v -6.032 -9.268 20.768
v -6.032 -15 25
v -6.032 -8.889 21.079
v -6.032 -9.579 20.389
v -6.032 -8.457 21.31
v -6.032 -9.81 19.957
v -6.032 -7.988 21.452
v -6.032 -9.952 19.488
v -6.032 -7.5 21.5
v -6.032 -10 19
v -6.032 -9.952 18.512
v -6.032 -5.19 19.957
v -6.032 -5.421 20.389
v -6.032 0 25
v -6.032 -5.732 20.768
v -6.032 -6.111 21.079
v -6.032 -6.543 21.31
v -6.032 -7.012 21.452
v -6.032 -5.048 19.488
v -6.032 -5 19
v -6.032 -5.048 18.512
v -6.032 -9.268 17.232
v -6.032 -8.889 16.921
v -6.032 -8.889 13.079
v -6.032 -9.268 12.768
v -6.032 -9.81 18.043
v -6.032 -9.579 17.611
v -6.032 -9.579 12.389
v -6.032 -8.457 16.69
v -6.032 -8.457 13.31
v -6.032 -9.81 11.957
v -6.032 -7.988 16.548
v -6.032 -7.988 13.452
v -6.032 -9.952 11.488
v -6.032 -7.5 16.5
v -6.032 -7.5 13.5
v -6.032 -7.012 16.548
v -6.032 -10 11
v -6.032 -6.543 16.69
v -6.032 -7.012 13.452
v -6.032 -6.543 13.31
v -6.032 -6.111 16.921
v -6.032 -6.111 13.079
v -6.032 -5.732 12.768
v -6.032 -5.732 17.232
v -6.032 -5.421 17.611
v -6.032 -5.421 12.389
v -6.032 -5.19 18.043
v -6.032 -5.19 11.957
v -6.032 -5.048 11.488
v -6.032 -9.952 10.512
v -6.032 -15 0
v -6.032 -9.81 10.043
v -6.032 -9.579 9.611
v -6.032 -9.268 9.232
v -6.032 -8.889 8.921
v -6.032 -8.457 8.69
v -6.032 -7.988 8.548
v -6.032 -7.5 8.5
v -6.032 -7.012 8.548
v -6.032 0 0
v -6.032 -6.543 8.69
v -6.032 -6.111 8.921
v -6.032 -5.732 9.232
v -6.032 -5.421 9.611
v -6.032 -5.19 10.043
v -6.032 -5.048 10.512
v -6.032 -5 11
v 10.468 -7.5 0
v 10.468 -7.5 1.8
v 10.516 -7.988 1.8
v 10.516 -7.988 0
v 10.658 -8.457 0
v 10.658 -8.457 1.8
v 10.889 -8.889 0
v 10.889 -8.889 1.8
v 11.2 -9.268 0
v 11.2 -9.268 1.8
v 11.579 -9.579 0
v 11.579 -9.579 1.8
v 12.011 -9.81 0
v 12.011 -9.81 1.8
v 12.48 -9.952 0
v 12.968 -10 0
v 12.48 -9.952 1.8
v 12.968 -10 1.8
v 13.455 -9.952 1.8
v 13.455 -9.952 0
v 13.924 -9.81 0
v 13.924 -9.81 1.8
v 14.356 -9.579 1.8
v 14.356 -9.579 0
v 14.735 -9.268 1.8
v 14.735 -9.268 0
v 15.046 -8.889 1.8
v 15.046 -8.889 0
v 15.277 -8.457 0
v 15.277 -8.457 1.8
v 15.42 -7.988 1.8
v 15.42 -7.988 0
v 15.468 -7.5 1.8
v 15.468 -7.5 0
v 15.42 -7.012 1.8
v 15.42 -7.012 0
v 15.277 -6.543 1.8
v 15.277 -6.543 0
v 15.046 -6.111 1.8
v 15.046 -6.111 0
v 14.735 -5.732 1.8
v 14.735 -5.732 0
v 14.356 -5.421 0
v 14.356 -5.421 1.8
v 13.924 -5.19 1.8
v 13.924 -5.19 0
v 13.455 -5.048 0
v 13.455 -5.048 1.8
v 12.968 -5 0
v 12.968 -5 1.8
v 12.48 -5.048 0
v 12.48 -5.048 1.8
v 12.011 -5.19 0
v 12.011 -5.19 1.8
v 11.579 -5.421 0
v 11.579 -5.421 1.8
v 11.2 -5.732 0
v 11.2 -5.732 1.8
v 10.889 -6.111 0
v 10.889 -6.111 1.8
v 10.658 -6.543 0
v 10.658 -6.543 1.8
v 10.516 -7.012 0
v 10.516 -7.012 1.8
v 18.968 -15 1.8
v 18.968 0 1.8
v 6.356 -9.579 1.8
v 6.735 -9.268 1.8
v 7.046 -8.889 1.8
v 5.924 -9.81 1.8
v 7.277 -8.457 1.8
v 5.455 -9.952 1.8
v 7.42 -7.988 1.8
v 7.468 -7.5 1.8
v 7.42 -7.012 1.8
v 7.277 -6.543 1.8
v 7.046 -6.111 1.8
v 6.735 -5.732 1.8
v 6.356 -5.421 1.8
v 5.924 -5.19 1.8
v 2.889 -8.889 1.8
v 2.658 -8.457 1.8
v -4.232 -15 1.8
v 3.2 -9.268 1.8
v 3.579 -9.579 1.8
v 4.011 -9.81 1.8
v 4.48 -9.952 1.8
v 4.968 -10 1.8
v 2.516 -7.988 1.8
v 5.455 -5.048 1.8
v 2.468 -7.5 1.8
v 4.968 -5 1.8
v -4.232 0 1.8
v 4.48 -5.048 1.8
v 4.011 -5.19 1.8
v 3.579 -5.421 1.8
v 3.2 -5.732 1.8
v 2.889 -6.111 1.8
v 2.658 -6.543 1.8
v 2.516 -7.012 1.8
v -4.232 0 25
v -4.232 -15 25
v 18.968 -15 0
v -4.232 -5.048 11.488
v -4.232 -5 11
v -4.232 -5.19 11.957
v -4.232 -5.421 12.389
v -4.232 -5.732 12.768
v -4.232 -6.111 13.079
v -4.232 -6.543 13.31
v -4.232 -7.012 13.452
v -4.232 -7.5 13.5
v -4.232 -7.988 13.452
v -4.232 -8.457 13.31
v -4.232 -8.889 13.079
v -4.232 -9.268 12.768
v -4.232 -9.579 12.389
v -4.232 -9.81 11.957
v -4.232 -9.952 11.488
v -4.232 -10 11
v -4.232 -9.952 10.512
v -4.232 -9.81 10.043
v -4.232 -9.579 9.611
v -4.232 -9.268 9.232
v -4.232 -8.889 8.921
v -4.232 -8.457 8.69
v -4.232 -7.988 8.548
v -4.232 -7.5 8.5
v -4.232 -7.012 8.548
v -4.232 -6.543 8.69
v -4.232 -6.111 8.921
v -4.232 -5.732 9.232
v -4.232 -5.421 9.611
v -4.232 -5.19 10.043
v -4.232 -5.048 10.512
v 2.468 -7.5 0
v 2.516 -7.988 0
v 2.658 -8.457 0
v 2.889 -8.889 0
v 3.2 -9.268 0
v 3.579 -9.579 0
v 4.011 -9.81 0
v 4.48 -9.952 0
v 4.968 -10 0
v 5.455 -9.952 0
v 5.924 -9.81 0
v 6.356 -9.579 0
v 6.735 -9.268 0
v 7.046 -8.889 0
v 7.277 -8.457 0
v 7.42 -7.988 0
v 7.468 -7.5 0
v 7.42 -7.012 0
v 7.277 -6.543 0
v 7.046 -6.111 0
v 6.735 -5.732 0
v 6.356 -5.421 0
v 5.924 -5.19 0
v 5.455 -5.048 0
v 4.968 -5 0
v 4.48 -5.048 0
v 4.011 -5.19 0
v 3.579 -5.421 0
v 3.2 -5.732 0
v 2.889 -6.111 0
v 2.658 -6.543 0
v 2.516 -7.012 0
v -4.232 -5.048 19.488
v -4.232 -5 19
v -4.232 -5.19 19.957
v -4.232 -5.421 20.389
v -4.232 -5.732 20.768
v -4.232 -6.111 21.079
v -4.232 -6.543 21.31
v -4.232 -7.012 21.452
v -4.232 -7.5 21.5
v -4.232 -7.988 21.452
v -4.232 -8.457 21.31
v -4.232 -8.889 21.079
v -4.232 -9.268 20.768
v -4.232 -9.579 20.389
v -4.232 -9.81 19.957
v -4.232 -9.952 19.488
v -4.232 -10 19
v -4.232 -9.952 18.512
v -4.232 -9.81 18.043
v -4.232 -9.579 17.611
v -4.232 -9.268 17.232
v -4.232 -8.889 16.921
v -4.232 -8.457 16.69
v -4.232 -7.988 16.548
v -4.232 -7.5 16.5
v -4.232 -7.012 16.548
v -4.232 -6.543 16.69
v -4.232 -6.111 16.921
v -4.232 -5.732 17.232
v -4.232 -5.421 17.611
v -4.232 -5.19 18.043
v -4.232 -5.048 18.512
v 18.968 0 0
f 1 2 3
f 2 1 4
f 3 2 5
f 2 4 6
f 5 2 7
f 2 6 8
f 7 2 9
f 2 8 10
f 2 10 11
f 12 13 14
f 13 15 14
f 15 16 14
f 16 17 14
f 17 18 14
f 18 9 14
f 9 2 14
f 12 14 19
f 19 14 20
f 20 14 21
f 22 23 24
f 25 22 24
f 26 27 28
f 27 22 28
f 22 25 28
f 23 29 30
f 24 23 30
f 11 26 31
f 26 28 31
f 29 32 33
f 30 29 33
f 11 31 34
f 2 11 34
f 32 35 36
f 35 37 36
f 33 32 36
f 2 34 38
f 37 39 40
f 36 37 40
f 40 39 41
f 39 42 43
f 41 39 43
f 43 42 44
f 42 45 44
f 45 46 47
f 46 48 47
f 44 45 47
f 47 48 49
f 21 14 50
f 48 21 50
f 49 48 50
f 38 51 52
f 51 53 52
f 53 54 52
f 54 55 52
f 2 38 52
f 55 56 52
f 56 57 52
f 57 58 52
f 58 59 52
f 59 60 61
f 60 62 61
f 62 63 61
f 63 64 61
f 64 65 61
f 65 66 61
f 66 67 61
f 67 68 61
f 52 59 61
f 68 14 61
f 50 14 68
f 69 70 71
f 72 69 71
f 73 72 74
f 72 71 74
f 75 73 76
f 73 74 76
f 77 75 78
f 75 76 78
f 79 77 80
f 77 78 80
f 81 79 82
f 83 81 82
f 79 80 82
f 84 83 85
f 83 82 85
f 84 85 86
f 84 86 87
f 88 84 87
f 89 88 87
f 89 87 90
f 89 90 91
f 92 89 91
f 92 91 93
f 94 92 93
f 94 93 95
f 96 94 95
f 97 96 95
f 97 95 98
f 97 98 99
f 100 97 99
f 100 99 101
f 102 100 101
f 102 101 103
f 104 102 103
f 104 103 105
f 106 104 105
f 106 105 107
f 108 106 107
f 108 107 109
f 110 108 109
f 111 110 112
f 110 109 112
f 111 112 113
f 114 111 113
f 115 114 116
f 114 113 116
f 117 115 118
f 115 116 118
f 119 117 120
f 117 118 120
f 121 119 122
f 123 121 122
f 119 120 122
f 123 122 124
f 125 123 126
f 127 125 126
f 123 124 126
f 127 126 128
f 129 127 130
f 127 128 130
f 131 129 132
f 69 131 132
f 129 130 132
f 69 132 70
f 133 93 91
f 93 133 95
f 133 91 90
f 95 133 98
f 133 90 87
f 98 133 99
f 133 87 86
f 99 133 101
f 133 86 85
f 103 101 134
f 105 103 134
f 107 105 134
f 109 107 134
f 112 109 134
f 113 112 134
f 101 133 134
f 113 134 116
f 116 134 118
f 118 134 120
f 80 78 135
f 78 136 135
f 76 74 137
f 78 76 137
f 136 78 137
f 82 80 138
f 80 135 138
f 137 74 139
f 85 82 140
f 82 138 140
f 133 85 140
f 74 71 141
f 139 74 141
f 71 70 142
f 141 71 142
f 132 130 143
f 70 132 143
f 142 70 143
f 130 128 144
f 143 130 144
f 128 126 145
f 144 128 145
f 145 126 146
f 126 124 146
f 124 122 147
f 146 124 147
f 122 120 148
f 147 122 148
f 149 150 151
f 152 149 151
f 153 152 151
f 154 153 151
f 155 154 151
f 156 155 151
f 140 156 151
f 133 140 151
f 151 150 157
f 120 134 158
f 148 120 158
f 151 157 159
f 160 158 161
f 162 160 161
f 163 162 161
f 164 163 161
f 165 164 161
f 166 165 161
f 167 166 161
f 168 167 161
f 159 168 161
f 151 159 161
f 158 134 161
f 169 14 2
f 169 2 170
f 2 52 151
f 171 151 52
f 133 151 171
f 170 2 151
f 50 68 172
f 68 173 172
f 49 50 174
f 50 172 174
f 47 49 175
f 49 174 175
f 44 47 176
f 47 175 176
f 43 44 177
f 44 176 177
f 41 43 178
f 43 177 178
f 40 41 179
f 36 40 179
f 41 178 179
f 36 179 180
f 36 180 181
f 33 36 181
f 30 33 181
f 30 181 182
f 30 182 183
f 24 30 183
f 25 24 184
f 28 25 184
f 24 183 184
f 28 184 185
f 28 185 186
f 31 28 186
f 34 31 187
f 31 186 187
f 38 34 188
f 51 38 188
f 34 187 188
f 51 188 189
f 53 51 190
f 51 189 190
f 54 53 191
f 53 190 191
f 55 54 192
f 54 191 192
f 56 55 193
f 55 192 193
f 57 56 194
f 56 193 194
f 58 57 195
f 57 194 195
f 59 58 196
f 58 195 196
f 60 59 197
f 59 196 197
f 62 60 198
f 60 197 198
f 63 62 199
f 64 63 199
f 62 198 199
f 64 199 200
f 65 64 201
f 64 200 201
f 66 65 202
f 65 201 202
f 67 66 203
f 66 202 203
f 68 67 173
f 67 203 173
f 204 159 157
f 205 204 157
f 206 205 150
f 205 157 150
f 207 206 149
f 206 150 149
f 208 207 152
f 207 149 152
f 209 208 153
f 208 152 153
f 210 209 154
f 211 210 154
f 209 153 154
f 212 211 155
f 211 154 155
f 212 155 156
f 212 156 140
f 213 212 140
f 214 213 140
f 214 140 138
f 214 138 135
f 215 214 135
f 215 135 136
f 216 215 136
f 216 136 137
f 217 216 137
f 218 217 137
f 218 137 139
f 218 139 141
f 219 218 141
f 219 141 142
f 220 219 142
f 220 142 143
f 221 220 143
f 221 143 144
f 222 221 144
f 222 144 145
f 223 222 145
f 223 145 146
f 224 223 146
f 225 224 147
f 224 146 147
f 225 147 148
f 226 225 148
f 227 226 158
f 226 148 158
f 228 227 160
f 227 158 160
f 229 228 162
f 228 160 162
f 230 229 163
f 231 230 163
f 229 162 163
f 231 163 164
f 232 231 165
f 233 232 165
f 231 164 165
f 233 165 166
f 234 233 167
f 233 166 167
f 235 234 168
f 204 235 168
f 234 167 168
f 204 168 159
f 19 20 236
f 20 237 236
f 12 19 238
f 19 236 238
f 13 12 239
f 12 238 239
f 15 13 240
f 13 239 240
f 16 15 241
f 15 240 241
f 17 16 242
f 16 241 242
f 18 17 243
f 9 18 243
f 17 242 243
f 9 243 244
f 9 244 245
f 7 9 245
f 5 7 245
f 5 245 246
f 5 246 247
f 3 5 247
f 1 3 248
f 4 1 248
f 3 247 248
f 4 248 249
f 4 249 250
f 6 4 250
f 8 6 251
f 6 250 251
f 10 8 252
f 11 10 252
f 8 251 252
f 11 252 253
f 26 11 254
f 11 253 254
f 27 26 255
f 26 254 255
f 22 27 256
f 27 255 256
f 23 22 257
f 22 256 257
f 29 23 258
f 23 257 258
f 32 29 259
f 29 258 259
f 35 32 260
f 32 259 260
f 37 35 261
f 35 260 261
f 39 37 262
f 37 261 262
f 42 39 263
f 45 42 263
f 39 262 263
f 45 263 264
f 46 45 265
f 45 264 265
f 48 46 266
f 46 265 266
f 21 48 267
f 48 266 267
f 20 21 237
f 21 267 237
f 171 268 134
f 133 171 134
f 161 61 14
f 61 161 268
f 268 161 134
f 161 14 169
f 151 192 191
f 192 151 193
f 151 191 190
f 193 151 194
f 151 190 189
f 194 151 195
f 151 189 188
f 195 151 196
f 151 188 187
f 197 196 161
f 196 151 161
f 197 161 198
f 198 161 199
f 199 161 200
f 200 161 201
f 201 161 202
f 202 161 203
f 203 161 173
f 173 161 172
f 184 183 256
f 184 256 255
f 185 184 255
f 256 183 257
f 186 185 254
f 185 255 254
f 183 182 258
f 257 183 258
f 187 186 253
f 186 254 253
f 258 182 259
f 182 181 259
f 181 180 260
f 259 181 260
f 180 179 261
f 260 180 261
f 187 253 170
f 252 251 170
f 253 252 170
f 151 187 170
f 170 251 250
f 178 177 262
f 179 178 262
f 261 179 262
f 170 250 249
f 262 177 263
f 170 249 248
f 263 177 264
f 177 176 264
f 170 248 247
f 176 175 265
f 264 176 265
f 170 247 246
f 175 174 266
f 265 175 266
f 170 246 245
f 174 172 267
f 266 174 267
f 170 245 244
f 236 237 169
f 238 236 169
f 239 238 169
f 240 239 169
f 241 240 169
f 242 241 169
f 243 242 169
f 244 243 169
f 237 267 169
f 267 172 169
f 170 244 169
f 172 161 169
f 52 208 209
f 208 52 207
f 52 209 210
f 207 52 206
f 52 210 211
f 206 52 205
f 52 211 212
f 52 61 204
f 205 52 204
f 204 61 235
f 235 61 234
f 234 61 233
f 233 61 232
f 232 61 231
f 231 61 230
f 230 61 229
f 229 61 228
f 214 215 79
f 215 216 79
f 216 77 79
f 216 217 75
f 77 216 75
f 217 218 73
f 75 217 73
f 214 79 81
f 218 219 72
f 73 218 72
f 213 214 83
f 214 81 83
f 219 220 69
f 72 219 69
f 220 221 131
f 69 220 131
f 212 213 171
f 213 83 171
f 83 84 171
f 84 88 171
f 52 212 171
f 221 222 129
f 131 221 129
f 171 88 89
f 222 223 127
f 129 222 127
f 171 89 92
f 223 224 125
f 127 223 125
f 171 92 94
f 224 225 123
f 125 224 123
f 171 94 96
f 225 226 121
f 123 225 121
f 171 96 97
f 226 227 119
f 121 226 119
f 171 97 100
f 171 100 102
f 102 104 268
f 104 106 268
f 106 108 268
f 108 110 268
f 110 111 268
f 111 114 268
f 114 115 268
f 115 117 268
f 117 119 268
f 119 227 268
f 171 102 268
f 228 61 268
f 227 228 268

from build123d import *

# Parameters (mm, degrees)
F0_W           = 1.8
F0_H           = 1.7999967287
F0_W_2         = 23.2
F0_H_2         = 23.2000032713
F1_DEPTH       = 15
F4_D           = 5
F4_DEPTH       = 1.8
F4_TIP         = 1.5021515476
F4_ON_F3_D     = 5
F4_ON_F3_DEPTH = 1.8
F4_ON_F3_TIP   = 1.5021515476


with BuildPart() as f1:
    # F0 (on Front) → F1 (new body)
    with BuildSketch(Plane.XZ):
        with Locations((-5.1324295796, 0.8999983644)):
            Rectangle(F0_W, F0_H)
        with Locations((7.3675704204, 0.8999983644)):
            Rectangle(F0_W_2, F0_H)
        with Locations((-5.1324295796, 13.3999983644)):
            Rectangle(F0_W, F0_H_2)
    extrude(amount=F1_DEPTH)

    # F4
    with Locations(Plane(origin=(-6.0324295796, 0, 0), x_dir=(0, -1, 0), z_dir=(-1, 0, 0))):
        with Locations((7.5, 19), (7.5, 11)):
            Hole(F4_D / 2, depth=F4_DEPTH)
            with Locations((0, 0, -(F4_DEPTH + F4_TIP / 2))):  # 118° drill point
                Cone(0, F4_D / 2, F4_TIP, mode=Mode.SUBTRACT)

    # F4 on F3
    with Locations(Plane(origin=(0, 0, 0), x_dir=(1, 0, 0), z_dir=(0, 0, -1))):
        with Locations((4.9675704204, 7.5), (12.9675704204, 7.5)):
            Hole(F4_ON_F3_D / 2, depth=F4_ON_F3_DEPTH)
            with Locations((0, 0, -(F4_ON_F3_DEPTH + F4_ON_F3_TIP / 2))):  # 118° drill point
                Cone(0, F4_ON_F3_D / 2, F4_ON_F3_TIP, mode=Mode.SUBTRACT)


solid = f1.part
